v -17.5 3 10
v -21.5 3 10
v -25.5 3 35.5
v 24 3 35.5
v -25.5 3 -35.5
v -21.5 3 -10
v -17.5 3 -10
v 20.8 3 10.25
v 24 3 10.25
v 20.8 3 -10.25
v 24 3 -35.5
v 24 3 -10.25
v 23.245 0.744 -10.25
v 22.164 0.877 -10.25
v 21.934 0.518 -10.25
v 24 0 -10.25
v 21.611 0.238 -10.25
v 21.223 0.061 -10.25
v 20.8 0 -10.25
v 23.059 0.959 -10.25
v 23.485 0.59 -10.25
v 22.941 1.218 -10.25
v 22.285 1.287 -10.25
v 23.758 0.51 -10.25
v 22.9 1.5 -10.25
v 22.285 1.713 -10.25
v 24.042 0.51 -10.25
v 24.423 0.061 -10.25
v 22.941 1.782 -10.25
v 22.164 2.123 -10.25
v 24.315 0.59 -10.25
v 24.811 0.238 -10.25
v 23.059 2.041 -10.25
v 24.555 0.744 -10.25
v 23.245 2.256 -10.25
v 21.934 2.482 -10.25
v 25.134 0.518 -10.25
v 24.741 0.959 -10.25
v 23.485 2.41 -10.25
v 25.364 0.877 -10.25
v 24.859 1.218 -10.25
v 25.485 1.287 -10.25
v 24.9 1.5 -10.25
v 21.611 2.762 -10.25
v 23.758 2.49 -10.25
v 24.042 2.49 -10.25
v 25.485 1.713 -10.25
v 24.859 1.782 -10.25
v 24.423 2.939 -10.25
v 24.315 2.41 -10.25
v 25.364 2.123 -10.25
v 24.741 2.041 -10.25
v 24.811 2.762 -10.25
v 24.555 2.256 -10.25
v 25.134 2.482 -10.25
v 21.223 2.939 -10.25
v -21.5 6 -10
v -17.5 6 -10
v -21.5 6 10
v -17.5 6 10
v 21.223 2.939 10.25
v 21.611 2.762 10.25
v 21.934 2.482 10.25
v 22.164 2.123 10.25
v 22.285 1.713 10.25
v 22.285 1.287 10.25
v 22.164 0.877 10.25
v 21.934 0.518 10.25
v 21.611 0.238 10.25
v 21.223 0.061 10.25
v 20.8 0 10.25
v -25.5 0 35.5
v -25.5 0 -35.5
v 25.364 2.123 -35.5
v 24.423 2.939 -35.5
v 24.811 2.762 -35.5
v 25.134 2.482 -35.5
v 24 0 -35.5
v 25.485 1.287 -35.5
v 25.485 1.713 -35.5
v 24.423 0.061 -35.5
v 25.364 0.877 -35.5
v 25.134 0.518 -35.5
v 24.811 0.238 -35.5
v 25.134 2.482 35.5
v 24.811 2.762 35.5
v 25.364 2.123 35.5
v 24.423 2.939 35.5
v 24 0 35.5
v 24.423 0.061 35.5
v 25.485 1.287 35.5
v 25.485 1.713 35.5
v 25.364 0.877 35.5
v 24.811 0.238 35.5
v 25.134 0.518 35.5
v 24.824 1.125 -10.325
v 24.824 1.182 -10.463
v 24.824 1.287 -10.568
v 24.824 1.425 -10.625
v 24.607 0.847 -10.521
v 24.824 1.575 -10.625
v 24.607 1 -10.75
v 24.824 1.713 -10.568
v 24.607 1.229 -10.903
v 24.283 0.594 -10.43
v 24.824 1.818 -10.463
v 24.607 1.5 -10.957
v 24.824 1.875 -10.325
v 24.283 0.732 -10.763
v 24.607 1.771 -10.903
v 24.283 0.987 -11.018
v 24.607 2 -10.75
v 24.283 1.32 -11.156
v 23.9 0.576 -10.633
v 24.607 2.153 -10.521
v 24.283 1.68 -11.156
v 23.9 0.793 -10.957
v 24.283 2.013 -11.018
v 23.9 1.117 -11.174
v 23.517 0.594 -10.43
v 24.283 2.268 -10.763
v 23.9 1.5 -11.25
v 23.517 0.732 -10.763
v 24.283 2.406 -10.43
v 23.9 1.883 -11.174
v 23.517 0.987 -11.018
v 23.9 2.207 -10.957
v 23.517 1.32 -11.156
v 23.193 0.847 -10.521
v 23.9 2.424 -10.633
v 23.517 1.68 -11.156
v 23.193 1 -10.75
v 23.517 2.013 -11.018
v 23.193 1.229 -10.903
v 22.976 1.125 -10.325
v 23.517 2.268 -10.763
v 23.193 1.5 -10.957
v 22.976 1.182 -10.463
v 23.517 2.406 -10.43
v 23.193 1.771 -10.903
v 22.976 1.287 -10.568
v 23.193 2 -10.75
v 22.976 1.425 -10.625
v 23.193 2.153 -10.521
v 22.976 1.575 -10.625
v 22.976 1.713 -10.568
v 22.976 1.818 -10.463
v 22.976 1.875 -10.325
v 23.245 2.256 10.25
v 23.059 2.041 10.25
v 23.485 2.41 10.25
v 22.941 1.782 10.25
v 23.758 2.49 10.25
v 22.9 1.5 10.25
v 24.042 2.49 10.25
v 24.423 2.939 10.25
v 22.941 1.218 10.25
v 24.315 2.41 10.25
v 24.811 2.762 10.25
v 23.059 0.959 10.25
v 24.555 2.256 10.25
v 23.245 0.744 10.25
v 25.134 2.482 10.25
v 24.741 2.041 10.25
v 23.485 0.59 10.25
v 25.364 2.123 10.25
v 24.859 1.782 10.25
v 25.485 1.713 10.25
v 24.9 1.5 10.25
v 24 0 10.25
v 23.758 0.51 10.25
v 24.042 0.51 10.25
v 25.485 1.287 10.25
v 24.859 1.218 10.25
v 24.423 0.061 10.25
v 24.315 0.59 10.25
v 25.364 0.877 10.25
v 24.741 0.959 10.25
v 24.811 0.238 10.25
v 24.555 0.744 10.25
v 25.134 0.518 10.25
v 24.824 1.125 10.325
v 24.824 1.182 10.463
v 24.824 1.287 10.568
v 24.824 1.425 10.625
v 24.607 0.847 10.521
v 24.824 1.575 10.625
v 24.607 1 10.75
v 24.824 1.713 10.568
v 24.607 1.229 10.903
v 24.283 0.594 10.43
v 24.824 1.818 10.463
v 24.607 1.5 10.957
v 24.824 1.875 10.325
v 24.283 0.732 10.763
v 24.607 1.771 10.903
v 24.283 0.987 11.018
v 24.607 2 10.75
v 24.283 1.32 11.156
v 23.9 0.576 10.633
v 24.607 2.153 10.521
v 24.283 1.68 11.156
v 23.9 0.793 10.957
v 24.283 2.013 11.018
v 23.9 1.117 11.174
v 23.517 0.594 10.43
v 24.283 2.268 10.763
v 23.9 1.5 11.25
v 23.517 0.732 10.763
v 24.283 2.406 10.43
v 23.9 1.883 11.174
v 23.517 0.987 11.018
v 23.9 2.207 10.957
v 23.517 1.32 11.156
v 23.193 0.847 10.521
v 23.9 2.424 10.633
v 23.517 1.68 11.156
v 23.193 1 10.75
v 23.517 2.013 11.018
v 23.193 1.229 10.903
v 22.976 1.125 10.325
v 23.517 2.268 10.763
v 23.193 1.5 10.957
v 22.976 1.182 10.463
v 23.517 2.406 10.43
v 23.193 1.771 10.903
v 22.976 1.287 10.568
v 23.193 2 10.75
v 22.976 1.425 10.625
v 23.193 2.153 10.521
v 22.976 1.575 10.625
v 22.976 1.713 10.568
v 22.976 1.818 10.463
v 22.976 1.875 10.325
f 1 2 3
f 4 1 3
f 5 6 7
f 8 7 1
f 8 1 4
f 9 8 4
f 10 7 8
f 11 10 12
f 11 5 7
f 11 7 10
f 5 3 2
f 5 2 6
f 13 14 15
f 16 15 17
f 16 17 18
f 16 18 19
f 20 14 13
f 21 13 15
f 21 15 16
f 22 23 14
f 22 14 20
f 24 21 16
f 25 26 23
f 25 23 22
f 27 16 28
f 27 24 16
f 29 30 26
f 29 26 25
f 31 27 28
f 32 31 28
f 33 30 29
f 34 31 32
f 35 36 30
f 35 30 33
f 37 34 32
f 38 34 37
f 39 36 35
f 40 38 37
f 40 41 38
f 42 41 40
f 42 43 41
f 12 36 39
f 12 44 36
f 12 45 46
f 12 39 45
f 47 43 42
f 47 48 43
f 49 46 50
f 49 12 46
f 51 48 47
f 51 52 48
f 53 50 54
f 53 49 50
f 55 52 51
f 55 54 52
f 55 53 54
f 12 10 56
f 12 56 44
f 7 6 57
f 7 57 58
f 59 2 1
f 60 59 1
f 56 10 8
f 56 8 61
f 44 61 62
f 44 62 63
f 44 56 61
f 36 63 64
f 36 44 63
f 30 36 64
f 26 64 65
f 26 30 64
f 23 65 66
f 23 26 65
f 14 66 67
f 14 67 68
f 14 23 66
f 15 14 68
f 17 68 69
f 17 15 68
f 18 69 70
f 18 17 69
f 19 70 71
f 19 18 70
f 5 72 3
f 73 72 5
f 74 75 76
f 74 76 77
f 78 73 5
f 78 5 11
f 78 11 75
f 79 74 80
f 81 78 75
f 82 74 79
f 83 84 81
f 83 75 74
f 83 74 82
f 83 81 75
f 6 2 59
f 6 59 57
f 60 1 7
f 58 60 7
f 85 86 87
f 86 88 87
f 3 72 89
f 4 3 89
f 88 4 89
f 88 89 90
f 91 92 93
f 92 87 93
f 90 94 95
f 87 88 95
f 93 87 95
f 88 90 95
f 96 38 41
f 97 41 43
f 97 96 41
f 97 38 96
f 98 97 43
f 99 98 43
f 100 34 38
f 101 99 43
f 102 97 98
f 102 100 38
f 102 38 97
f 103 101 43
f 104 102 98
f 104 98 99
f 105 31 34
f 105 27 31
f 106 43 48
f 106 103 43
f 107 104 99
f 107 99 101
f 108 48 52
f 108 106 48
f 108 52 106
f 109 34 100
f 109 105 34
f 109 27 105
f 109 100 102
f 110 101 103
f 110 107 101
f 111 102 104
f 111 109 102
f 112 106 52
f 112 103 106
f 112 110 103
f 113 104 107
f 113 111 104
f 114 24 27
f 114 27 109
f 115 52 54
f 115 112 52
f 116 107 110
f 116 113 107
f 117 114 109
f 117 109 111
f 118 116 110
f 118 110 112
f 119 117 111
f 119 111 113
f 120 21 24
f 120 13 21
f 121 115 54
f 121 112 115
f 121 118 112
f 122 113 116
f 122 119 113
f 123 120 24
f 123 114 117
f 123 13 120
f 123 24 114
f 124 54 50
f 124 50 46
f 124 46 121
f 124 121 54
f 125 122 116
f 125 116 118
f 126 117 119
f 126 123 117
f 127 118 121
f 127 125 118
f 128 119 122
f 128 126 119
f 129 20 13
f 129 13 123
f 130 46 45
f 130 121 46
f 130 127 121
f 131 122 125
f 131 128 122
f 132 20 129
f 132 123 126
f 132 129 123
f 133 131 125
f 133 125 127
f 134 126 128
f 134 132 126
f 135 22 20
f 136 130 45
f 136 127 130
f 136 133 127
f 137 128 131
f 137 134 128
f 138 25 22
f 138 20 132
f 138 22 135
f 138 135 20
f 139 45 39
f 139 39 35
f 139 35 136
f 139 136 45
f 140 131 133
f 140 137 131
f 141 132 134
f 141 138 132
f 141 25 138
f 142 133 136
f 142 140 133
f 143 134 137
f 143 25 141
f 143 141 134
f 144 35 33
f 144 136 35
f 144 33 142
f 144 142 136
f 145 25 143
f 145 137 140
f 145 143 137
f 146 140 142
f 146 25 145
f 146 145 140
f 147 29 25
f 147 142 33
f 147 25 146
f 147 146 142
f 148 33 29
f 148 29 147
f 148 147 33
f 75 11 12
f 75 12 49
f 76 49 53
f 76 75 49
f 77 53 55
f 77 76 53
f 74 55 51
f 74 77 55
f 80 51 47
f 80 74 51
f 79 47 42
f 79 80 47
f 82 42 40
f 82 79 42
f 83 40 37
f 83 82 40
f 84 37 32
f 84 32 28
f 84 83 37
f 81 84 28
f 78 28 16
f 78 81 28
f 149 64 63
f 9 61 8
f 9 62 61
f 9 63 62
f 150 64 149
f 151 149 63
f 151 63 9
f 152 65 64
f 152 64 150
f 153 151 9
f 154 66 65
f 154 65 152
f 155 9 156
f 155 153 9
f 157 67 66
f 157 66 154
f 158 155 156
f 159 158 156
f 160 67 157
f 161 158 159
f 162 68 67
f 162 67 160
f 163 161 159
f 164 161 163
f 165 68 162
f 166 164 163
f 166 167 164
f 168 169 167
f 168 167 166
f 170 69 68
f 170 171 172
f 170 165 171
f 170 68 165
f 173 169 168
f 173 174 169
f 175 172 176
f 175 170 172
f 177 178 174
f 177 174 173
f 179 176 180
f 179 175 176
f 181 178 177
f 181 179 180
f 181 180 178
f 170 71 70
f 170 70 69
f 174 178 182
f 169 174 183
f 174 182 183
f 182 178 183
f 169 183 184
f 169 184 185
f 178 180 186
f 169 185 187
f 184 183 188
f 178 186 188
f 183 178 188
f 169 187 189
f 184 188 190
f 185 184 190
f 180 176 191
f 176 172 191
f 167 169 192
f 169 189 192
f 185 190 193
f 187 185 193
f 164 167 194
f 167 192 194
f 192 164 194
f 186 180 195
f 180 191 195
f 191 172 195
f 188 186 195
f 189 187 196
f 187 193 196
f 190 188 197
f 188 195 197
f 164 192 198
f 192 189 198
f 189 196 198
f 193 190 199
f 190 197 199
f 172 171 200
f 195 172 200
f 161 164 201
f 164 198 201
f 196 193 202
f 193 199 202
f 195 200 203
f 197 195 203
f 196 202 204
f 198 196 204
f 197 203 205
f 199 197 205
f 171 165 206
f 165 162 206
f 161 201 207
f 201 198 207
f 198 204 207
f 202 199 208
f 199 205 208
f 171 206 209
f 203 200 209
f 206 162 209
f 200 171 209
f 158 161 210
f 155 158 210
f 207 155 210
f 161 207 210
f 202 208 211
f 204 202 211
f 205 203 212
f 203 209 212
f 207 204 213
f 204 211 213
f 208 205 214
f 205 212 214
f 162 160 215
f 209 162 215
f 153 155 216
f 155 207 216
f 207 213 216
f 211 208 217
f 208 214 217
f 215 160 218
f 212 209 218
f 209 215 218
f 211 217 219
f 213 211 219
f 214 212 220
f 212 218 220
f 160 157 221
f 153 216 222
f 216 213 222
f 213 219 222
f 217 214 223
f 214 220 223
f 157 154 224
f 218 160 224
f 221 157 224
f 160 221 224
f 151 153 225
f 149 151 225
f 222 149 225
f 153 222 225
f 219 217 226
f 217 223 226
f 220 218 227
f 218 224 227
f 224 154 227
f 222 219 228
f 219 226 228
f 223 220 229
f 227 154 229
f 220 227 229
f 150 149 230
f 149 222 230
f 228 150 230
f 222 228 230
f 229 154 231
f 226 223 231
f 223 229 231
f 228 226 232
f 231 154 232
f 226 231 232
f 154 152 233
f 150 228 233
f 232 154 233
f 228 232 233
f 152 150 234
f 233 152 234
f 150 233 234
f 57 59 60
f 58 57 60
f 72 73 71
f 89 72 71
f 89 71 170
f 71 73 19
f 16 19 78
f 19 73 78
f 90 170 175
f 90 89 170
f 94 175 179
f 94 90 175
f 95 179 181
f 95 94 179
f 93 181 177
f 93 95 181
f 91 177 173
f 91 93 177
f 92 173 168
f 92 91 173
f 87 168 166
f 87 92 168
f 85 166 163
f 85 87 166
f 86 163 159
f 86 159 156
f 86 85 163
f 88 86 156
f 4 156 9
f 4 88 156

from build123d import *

# Parameters (mm, degrees)
SKETCH1_W           = 51
SKETCH1_H           = 71
BOSS_EXTRUDE1_DEPTH = 3
SKETCH2_W           = 4
SKETCH2_H           = 20
BOSS_EXTRUDE3_DEPTH = 3
SKETCH4_W           = 3.2
SKETCH4_H           = 20.5
CUT_EXTRUDE1_DEPTH  = 5
FILLET1_RADIUS      = 1.5
FILLET1_LENGTH      = 25.25
FILLET2_RADIUS      = 1.5
FILLET2_LENGTH      = 20.5
FILLET3_RADIUS      = 1.5
FILLET3_LENGTH      = 25.25


with BuildPart() as part:
    # Sketch1 → Boss-Extrude1 (new body)
    with BuildSketch(Plane(origin=(0, 0, 0), x_dir=(1, 0, 0), z_dir=(0, 1, 0))):
        Rectangle(SKETCH1_W, SKETCH1_H)
    extrude(amount=BOSS_EXTRUDE1_DEPTH)

    # Sketch2 → Boss-Extrude3 (add)
    with BuildSketch(Plane(origin=(0, 3, 0), x_dir=(1, 0, 0), z_dir=(0, 1, 0))):
        with Locations((-19.5, 0)):
            Rectangle(SKETCH2_W, SKETCH2_H)
    extrude(amount=BOSS_EXTRUDE3_DEPTH)

    # Sketch4 → Cut-Extrude1 (cut)
    with BuildSketch(Plane(origin=(0, 3, 0), x_dir=(1, 0, 0), z_dir=(0, 1, 0))):
        with Locations((23.9, 0)):
            Rectangle(SKETCH4_W, SKETCH4_H)
    extrude(amount=-CUT_EXTRUDE1_DEPTH, mode=Mode.SUBTRACT)

    # Sketch6 → Cut-Revolve1 (revolve, cut)
    with BuildSketch(Plane.XY.offset(-10.25)):
        with BuildLine():
            Line((22.90000003, 1.5), (24.89999997, 1.5))
            ThreePointArc((24.89999997, 1.5), (23.9, 0.50000003), (22.90000003, 1.5))
        make_face()
    cut_revolve1 = revolve(axis=Axis((22.90000003, 1.5, -10.25), (1, 0, 0)), mode=Mode.SUBTRACT)

    # Mirror1: Cut-Revolve1 across plane
    add(cut_revolve1.mirror(Plane.XY), mode=Mode.SUBTRACT)

    # Fillet1: full round fillet: the end face becomes a half cylinder, R = half its width
    fillet1_face = Plane((25.5, 1.5, 22.875), x_dir=(0, 0, 1), z_dir=(1, 0, 0))  # on the end face: x along it, z out of the body
    fillet1_slab = fillet1_face.offset(-FILLET1_RADIUS / 2) * Box(FILLET1_LENGTH, 2 * FILLET1_RADIUS, FILLET1_RADIUS, mode=Mode.PRIVATE)  # the body's end, R deep
    fillet1_round = Plane((24, 1.5, 22.875), x_dir=(1, 0, 0), z_dir=(0, 0, 1)) * Cylinder(FILLET1_RADIUS, FILLET1_LENGTH, mode=Mode.PRIVATE)  # its axis R under the face
    add(fillet1_slab - fillet1_round, mode=Mode.SUBTRACT)

    # Fillet2: full round fillet: the end face becomes a half cylinder, R = half its width
    fillet2_face = Plane((22.3, 1.5, 0), x_dir=(0, 0, -1), z_dir=(1, 0, 0))  # on the end face: x along it, z out of the body
    fillet2_slab = fillet2_face.offset(-FILLET2_RADIUS / 2) * Box(FILLET2_LENGTH, 2 * FILLET2_RADIUS, FILLET2_RADIUS, mode=Mode.PRIVATE)  # the body's end, R deep
    fillet2_round = Plane((20.8, 1.5, 0), x_dir=(1, 0, 0), z_dir=(0, 0, -1)) * Cylinder(FILLET2_RADIUS, FILLET2_LENGTH, mode=Mode.PRIVATE)  # its axis R under the face
    add(fillet2_slab - fillet2_round, mode=Mode.SUBTRACT)

    # Fillet3: full round fillet: the end face becomes a half cylinder, R = half its width
    fillet3_face = Plane((25.5, 1.5, -22.875), x_dir=(0, 0, -1), z_dir=(1, 0, 0))  # on the end face: x along it, z out of the body
    fillet3_slab = fillet3_face.offset(-FILLET3_RADIUS / 2) * Box(FILLET3_LENGTH, 2 * FILLET3_RADIUS, FILLET3_RADIUS, mode=Mode.PRIVATE)  # the body's end, R deep
    fillet3_round = Plane((24, 1.5, -22.875), x_dir=(1, 0, 0), z_dir=(0, 0, -1)) * Cylinder(FILLET3_RADIUS, FILLET3_LENGTH, mode=Mode.PRIVATE)  # its axis R under the face
    add(fillet3_slab - fillet3_round, mode=Mode.SUBTRACT)


solid = part.part
